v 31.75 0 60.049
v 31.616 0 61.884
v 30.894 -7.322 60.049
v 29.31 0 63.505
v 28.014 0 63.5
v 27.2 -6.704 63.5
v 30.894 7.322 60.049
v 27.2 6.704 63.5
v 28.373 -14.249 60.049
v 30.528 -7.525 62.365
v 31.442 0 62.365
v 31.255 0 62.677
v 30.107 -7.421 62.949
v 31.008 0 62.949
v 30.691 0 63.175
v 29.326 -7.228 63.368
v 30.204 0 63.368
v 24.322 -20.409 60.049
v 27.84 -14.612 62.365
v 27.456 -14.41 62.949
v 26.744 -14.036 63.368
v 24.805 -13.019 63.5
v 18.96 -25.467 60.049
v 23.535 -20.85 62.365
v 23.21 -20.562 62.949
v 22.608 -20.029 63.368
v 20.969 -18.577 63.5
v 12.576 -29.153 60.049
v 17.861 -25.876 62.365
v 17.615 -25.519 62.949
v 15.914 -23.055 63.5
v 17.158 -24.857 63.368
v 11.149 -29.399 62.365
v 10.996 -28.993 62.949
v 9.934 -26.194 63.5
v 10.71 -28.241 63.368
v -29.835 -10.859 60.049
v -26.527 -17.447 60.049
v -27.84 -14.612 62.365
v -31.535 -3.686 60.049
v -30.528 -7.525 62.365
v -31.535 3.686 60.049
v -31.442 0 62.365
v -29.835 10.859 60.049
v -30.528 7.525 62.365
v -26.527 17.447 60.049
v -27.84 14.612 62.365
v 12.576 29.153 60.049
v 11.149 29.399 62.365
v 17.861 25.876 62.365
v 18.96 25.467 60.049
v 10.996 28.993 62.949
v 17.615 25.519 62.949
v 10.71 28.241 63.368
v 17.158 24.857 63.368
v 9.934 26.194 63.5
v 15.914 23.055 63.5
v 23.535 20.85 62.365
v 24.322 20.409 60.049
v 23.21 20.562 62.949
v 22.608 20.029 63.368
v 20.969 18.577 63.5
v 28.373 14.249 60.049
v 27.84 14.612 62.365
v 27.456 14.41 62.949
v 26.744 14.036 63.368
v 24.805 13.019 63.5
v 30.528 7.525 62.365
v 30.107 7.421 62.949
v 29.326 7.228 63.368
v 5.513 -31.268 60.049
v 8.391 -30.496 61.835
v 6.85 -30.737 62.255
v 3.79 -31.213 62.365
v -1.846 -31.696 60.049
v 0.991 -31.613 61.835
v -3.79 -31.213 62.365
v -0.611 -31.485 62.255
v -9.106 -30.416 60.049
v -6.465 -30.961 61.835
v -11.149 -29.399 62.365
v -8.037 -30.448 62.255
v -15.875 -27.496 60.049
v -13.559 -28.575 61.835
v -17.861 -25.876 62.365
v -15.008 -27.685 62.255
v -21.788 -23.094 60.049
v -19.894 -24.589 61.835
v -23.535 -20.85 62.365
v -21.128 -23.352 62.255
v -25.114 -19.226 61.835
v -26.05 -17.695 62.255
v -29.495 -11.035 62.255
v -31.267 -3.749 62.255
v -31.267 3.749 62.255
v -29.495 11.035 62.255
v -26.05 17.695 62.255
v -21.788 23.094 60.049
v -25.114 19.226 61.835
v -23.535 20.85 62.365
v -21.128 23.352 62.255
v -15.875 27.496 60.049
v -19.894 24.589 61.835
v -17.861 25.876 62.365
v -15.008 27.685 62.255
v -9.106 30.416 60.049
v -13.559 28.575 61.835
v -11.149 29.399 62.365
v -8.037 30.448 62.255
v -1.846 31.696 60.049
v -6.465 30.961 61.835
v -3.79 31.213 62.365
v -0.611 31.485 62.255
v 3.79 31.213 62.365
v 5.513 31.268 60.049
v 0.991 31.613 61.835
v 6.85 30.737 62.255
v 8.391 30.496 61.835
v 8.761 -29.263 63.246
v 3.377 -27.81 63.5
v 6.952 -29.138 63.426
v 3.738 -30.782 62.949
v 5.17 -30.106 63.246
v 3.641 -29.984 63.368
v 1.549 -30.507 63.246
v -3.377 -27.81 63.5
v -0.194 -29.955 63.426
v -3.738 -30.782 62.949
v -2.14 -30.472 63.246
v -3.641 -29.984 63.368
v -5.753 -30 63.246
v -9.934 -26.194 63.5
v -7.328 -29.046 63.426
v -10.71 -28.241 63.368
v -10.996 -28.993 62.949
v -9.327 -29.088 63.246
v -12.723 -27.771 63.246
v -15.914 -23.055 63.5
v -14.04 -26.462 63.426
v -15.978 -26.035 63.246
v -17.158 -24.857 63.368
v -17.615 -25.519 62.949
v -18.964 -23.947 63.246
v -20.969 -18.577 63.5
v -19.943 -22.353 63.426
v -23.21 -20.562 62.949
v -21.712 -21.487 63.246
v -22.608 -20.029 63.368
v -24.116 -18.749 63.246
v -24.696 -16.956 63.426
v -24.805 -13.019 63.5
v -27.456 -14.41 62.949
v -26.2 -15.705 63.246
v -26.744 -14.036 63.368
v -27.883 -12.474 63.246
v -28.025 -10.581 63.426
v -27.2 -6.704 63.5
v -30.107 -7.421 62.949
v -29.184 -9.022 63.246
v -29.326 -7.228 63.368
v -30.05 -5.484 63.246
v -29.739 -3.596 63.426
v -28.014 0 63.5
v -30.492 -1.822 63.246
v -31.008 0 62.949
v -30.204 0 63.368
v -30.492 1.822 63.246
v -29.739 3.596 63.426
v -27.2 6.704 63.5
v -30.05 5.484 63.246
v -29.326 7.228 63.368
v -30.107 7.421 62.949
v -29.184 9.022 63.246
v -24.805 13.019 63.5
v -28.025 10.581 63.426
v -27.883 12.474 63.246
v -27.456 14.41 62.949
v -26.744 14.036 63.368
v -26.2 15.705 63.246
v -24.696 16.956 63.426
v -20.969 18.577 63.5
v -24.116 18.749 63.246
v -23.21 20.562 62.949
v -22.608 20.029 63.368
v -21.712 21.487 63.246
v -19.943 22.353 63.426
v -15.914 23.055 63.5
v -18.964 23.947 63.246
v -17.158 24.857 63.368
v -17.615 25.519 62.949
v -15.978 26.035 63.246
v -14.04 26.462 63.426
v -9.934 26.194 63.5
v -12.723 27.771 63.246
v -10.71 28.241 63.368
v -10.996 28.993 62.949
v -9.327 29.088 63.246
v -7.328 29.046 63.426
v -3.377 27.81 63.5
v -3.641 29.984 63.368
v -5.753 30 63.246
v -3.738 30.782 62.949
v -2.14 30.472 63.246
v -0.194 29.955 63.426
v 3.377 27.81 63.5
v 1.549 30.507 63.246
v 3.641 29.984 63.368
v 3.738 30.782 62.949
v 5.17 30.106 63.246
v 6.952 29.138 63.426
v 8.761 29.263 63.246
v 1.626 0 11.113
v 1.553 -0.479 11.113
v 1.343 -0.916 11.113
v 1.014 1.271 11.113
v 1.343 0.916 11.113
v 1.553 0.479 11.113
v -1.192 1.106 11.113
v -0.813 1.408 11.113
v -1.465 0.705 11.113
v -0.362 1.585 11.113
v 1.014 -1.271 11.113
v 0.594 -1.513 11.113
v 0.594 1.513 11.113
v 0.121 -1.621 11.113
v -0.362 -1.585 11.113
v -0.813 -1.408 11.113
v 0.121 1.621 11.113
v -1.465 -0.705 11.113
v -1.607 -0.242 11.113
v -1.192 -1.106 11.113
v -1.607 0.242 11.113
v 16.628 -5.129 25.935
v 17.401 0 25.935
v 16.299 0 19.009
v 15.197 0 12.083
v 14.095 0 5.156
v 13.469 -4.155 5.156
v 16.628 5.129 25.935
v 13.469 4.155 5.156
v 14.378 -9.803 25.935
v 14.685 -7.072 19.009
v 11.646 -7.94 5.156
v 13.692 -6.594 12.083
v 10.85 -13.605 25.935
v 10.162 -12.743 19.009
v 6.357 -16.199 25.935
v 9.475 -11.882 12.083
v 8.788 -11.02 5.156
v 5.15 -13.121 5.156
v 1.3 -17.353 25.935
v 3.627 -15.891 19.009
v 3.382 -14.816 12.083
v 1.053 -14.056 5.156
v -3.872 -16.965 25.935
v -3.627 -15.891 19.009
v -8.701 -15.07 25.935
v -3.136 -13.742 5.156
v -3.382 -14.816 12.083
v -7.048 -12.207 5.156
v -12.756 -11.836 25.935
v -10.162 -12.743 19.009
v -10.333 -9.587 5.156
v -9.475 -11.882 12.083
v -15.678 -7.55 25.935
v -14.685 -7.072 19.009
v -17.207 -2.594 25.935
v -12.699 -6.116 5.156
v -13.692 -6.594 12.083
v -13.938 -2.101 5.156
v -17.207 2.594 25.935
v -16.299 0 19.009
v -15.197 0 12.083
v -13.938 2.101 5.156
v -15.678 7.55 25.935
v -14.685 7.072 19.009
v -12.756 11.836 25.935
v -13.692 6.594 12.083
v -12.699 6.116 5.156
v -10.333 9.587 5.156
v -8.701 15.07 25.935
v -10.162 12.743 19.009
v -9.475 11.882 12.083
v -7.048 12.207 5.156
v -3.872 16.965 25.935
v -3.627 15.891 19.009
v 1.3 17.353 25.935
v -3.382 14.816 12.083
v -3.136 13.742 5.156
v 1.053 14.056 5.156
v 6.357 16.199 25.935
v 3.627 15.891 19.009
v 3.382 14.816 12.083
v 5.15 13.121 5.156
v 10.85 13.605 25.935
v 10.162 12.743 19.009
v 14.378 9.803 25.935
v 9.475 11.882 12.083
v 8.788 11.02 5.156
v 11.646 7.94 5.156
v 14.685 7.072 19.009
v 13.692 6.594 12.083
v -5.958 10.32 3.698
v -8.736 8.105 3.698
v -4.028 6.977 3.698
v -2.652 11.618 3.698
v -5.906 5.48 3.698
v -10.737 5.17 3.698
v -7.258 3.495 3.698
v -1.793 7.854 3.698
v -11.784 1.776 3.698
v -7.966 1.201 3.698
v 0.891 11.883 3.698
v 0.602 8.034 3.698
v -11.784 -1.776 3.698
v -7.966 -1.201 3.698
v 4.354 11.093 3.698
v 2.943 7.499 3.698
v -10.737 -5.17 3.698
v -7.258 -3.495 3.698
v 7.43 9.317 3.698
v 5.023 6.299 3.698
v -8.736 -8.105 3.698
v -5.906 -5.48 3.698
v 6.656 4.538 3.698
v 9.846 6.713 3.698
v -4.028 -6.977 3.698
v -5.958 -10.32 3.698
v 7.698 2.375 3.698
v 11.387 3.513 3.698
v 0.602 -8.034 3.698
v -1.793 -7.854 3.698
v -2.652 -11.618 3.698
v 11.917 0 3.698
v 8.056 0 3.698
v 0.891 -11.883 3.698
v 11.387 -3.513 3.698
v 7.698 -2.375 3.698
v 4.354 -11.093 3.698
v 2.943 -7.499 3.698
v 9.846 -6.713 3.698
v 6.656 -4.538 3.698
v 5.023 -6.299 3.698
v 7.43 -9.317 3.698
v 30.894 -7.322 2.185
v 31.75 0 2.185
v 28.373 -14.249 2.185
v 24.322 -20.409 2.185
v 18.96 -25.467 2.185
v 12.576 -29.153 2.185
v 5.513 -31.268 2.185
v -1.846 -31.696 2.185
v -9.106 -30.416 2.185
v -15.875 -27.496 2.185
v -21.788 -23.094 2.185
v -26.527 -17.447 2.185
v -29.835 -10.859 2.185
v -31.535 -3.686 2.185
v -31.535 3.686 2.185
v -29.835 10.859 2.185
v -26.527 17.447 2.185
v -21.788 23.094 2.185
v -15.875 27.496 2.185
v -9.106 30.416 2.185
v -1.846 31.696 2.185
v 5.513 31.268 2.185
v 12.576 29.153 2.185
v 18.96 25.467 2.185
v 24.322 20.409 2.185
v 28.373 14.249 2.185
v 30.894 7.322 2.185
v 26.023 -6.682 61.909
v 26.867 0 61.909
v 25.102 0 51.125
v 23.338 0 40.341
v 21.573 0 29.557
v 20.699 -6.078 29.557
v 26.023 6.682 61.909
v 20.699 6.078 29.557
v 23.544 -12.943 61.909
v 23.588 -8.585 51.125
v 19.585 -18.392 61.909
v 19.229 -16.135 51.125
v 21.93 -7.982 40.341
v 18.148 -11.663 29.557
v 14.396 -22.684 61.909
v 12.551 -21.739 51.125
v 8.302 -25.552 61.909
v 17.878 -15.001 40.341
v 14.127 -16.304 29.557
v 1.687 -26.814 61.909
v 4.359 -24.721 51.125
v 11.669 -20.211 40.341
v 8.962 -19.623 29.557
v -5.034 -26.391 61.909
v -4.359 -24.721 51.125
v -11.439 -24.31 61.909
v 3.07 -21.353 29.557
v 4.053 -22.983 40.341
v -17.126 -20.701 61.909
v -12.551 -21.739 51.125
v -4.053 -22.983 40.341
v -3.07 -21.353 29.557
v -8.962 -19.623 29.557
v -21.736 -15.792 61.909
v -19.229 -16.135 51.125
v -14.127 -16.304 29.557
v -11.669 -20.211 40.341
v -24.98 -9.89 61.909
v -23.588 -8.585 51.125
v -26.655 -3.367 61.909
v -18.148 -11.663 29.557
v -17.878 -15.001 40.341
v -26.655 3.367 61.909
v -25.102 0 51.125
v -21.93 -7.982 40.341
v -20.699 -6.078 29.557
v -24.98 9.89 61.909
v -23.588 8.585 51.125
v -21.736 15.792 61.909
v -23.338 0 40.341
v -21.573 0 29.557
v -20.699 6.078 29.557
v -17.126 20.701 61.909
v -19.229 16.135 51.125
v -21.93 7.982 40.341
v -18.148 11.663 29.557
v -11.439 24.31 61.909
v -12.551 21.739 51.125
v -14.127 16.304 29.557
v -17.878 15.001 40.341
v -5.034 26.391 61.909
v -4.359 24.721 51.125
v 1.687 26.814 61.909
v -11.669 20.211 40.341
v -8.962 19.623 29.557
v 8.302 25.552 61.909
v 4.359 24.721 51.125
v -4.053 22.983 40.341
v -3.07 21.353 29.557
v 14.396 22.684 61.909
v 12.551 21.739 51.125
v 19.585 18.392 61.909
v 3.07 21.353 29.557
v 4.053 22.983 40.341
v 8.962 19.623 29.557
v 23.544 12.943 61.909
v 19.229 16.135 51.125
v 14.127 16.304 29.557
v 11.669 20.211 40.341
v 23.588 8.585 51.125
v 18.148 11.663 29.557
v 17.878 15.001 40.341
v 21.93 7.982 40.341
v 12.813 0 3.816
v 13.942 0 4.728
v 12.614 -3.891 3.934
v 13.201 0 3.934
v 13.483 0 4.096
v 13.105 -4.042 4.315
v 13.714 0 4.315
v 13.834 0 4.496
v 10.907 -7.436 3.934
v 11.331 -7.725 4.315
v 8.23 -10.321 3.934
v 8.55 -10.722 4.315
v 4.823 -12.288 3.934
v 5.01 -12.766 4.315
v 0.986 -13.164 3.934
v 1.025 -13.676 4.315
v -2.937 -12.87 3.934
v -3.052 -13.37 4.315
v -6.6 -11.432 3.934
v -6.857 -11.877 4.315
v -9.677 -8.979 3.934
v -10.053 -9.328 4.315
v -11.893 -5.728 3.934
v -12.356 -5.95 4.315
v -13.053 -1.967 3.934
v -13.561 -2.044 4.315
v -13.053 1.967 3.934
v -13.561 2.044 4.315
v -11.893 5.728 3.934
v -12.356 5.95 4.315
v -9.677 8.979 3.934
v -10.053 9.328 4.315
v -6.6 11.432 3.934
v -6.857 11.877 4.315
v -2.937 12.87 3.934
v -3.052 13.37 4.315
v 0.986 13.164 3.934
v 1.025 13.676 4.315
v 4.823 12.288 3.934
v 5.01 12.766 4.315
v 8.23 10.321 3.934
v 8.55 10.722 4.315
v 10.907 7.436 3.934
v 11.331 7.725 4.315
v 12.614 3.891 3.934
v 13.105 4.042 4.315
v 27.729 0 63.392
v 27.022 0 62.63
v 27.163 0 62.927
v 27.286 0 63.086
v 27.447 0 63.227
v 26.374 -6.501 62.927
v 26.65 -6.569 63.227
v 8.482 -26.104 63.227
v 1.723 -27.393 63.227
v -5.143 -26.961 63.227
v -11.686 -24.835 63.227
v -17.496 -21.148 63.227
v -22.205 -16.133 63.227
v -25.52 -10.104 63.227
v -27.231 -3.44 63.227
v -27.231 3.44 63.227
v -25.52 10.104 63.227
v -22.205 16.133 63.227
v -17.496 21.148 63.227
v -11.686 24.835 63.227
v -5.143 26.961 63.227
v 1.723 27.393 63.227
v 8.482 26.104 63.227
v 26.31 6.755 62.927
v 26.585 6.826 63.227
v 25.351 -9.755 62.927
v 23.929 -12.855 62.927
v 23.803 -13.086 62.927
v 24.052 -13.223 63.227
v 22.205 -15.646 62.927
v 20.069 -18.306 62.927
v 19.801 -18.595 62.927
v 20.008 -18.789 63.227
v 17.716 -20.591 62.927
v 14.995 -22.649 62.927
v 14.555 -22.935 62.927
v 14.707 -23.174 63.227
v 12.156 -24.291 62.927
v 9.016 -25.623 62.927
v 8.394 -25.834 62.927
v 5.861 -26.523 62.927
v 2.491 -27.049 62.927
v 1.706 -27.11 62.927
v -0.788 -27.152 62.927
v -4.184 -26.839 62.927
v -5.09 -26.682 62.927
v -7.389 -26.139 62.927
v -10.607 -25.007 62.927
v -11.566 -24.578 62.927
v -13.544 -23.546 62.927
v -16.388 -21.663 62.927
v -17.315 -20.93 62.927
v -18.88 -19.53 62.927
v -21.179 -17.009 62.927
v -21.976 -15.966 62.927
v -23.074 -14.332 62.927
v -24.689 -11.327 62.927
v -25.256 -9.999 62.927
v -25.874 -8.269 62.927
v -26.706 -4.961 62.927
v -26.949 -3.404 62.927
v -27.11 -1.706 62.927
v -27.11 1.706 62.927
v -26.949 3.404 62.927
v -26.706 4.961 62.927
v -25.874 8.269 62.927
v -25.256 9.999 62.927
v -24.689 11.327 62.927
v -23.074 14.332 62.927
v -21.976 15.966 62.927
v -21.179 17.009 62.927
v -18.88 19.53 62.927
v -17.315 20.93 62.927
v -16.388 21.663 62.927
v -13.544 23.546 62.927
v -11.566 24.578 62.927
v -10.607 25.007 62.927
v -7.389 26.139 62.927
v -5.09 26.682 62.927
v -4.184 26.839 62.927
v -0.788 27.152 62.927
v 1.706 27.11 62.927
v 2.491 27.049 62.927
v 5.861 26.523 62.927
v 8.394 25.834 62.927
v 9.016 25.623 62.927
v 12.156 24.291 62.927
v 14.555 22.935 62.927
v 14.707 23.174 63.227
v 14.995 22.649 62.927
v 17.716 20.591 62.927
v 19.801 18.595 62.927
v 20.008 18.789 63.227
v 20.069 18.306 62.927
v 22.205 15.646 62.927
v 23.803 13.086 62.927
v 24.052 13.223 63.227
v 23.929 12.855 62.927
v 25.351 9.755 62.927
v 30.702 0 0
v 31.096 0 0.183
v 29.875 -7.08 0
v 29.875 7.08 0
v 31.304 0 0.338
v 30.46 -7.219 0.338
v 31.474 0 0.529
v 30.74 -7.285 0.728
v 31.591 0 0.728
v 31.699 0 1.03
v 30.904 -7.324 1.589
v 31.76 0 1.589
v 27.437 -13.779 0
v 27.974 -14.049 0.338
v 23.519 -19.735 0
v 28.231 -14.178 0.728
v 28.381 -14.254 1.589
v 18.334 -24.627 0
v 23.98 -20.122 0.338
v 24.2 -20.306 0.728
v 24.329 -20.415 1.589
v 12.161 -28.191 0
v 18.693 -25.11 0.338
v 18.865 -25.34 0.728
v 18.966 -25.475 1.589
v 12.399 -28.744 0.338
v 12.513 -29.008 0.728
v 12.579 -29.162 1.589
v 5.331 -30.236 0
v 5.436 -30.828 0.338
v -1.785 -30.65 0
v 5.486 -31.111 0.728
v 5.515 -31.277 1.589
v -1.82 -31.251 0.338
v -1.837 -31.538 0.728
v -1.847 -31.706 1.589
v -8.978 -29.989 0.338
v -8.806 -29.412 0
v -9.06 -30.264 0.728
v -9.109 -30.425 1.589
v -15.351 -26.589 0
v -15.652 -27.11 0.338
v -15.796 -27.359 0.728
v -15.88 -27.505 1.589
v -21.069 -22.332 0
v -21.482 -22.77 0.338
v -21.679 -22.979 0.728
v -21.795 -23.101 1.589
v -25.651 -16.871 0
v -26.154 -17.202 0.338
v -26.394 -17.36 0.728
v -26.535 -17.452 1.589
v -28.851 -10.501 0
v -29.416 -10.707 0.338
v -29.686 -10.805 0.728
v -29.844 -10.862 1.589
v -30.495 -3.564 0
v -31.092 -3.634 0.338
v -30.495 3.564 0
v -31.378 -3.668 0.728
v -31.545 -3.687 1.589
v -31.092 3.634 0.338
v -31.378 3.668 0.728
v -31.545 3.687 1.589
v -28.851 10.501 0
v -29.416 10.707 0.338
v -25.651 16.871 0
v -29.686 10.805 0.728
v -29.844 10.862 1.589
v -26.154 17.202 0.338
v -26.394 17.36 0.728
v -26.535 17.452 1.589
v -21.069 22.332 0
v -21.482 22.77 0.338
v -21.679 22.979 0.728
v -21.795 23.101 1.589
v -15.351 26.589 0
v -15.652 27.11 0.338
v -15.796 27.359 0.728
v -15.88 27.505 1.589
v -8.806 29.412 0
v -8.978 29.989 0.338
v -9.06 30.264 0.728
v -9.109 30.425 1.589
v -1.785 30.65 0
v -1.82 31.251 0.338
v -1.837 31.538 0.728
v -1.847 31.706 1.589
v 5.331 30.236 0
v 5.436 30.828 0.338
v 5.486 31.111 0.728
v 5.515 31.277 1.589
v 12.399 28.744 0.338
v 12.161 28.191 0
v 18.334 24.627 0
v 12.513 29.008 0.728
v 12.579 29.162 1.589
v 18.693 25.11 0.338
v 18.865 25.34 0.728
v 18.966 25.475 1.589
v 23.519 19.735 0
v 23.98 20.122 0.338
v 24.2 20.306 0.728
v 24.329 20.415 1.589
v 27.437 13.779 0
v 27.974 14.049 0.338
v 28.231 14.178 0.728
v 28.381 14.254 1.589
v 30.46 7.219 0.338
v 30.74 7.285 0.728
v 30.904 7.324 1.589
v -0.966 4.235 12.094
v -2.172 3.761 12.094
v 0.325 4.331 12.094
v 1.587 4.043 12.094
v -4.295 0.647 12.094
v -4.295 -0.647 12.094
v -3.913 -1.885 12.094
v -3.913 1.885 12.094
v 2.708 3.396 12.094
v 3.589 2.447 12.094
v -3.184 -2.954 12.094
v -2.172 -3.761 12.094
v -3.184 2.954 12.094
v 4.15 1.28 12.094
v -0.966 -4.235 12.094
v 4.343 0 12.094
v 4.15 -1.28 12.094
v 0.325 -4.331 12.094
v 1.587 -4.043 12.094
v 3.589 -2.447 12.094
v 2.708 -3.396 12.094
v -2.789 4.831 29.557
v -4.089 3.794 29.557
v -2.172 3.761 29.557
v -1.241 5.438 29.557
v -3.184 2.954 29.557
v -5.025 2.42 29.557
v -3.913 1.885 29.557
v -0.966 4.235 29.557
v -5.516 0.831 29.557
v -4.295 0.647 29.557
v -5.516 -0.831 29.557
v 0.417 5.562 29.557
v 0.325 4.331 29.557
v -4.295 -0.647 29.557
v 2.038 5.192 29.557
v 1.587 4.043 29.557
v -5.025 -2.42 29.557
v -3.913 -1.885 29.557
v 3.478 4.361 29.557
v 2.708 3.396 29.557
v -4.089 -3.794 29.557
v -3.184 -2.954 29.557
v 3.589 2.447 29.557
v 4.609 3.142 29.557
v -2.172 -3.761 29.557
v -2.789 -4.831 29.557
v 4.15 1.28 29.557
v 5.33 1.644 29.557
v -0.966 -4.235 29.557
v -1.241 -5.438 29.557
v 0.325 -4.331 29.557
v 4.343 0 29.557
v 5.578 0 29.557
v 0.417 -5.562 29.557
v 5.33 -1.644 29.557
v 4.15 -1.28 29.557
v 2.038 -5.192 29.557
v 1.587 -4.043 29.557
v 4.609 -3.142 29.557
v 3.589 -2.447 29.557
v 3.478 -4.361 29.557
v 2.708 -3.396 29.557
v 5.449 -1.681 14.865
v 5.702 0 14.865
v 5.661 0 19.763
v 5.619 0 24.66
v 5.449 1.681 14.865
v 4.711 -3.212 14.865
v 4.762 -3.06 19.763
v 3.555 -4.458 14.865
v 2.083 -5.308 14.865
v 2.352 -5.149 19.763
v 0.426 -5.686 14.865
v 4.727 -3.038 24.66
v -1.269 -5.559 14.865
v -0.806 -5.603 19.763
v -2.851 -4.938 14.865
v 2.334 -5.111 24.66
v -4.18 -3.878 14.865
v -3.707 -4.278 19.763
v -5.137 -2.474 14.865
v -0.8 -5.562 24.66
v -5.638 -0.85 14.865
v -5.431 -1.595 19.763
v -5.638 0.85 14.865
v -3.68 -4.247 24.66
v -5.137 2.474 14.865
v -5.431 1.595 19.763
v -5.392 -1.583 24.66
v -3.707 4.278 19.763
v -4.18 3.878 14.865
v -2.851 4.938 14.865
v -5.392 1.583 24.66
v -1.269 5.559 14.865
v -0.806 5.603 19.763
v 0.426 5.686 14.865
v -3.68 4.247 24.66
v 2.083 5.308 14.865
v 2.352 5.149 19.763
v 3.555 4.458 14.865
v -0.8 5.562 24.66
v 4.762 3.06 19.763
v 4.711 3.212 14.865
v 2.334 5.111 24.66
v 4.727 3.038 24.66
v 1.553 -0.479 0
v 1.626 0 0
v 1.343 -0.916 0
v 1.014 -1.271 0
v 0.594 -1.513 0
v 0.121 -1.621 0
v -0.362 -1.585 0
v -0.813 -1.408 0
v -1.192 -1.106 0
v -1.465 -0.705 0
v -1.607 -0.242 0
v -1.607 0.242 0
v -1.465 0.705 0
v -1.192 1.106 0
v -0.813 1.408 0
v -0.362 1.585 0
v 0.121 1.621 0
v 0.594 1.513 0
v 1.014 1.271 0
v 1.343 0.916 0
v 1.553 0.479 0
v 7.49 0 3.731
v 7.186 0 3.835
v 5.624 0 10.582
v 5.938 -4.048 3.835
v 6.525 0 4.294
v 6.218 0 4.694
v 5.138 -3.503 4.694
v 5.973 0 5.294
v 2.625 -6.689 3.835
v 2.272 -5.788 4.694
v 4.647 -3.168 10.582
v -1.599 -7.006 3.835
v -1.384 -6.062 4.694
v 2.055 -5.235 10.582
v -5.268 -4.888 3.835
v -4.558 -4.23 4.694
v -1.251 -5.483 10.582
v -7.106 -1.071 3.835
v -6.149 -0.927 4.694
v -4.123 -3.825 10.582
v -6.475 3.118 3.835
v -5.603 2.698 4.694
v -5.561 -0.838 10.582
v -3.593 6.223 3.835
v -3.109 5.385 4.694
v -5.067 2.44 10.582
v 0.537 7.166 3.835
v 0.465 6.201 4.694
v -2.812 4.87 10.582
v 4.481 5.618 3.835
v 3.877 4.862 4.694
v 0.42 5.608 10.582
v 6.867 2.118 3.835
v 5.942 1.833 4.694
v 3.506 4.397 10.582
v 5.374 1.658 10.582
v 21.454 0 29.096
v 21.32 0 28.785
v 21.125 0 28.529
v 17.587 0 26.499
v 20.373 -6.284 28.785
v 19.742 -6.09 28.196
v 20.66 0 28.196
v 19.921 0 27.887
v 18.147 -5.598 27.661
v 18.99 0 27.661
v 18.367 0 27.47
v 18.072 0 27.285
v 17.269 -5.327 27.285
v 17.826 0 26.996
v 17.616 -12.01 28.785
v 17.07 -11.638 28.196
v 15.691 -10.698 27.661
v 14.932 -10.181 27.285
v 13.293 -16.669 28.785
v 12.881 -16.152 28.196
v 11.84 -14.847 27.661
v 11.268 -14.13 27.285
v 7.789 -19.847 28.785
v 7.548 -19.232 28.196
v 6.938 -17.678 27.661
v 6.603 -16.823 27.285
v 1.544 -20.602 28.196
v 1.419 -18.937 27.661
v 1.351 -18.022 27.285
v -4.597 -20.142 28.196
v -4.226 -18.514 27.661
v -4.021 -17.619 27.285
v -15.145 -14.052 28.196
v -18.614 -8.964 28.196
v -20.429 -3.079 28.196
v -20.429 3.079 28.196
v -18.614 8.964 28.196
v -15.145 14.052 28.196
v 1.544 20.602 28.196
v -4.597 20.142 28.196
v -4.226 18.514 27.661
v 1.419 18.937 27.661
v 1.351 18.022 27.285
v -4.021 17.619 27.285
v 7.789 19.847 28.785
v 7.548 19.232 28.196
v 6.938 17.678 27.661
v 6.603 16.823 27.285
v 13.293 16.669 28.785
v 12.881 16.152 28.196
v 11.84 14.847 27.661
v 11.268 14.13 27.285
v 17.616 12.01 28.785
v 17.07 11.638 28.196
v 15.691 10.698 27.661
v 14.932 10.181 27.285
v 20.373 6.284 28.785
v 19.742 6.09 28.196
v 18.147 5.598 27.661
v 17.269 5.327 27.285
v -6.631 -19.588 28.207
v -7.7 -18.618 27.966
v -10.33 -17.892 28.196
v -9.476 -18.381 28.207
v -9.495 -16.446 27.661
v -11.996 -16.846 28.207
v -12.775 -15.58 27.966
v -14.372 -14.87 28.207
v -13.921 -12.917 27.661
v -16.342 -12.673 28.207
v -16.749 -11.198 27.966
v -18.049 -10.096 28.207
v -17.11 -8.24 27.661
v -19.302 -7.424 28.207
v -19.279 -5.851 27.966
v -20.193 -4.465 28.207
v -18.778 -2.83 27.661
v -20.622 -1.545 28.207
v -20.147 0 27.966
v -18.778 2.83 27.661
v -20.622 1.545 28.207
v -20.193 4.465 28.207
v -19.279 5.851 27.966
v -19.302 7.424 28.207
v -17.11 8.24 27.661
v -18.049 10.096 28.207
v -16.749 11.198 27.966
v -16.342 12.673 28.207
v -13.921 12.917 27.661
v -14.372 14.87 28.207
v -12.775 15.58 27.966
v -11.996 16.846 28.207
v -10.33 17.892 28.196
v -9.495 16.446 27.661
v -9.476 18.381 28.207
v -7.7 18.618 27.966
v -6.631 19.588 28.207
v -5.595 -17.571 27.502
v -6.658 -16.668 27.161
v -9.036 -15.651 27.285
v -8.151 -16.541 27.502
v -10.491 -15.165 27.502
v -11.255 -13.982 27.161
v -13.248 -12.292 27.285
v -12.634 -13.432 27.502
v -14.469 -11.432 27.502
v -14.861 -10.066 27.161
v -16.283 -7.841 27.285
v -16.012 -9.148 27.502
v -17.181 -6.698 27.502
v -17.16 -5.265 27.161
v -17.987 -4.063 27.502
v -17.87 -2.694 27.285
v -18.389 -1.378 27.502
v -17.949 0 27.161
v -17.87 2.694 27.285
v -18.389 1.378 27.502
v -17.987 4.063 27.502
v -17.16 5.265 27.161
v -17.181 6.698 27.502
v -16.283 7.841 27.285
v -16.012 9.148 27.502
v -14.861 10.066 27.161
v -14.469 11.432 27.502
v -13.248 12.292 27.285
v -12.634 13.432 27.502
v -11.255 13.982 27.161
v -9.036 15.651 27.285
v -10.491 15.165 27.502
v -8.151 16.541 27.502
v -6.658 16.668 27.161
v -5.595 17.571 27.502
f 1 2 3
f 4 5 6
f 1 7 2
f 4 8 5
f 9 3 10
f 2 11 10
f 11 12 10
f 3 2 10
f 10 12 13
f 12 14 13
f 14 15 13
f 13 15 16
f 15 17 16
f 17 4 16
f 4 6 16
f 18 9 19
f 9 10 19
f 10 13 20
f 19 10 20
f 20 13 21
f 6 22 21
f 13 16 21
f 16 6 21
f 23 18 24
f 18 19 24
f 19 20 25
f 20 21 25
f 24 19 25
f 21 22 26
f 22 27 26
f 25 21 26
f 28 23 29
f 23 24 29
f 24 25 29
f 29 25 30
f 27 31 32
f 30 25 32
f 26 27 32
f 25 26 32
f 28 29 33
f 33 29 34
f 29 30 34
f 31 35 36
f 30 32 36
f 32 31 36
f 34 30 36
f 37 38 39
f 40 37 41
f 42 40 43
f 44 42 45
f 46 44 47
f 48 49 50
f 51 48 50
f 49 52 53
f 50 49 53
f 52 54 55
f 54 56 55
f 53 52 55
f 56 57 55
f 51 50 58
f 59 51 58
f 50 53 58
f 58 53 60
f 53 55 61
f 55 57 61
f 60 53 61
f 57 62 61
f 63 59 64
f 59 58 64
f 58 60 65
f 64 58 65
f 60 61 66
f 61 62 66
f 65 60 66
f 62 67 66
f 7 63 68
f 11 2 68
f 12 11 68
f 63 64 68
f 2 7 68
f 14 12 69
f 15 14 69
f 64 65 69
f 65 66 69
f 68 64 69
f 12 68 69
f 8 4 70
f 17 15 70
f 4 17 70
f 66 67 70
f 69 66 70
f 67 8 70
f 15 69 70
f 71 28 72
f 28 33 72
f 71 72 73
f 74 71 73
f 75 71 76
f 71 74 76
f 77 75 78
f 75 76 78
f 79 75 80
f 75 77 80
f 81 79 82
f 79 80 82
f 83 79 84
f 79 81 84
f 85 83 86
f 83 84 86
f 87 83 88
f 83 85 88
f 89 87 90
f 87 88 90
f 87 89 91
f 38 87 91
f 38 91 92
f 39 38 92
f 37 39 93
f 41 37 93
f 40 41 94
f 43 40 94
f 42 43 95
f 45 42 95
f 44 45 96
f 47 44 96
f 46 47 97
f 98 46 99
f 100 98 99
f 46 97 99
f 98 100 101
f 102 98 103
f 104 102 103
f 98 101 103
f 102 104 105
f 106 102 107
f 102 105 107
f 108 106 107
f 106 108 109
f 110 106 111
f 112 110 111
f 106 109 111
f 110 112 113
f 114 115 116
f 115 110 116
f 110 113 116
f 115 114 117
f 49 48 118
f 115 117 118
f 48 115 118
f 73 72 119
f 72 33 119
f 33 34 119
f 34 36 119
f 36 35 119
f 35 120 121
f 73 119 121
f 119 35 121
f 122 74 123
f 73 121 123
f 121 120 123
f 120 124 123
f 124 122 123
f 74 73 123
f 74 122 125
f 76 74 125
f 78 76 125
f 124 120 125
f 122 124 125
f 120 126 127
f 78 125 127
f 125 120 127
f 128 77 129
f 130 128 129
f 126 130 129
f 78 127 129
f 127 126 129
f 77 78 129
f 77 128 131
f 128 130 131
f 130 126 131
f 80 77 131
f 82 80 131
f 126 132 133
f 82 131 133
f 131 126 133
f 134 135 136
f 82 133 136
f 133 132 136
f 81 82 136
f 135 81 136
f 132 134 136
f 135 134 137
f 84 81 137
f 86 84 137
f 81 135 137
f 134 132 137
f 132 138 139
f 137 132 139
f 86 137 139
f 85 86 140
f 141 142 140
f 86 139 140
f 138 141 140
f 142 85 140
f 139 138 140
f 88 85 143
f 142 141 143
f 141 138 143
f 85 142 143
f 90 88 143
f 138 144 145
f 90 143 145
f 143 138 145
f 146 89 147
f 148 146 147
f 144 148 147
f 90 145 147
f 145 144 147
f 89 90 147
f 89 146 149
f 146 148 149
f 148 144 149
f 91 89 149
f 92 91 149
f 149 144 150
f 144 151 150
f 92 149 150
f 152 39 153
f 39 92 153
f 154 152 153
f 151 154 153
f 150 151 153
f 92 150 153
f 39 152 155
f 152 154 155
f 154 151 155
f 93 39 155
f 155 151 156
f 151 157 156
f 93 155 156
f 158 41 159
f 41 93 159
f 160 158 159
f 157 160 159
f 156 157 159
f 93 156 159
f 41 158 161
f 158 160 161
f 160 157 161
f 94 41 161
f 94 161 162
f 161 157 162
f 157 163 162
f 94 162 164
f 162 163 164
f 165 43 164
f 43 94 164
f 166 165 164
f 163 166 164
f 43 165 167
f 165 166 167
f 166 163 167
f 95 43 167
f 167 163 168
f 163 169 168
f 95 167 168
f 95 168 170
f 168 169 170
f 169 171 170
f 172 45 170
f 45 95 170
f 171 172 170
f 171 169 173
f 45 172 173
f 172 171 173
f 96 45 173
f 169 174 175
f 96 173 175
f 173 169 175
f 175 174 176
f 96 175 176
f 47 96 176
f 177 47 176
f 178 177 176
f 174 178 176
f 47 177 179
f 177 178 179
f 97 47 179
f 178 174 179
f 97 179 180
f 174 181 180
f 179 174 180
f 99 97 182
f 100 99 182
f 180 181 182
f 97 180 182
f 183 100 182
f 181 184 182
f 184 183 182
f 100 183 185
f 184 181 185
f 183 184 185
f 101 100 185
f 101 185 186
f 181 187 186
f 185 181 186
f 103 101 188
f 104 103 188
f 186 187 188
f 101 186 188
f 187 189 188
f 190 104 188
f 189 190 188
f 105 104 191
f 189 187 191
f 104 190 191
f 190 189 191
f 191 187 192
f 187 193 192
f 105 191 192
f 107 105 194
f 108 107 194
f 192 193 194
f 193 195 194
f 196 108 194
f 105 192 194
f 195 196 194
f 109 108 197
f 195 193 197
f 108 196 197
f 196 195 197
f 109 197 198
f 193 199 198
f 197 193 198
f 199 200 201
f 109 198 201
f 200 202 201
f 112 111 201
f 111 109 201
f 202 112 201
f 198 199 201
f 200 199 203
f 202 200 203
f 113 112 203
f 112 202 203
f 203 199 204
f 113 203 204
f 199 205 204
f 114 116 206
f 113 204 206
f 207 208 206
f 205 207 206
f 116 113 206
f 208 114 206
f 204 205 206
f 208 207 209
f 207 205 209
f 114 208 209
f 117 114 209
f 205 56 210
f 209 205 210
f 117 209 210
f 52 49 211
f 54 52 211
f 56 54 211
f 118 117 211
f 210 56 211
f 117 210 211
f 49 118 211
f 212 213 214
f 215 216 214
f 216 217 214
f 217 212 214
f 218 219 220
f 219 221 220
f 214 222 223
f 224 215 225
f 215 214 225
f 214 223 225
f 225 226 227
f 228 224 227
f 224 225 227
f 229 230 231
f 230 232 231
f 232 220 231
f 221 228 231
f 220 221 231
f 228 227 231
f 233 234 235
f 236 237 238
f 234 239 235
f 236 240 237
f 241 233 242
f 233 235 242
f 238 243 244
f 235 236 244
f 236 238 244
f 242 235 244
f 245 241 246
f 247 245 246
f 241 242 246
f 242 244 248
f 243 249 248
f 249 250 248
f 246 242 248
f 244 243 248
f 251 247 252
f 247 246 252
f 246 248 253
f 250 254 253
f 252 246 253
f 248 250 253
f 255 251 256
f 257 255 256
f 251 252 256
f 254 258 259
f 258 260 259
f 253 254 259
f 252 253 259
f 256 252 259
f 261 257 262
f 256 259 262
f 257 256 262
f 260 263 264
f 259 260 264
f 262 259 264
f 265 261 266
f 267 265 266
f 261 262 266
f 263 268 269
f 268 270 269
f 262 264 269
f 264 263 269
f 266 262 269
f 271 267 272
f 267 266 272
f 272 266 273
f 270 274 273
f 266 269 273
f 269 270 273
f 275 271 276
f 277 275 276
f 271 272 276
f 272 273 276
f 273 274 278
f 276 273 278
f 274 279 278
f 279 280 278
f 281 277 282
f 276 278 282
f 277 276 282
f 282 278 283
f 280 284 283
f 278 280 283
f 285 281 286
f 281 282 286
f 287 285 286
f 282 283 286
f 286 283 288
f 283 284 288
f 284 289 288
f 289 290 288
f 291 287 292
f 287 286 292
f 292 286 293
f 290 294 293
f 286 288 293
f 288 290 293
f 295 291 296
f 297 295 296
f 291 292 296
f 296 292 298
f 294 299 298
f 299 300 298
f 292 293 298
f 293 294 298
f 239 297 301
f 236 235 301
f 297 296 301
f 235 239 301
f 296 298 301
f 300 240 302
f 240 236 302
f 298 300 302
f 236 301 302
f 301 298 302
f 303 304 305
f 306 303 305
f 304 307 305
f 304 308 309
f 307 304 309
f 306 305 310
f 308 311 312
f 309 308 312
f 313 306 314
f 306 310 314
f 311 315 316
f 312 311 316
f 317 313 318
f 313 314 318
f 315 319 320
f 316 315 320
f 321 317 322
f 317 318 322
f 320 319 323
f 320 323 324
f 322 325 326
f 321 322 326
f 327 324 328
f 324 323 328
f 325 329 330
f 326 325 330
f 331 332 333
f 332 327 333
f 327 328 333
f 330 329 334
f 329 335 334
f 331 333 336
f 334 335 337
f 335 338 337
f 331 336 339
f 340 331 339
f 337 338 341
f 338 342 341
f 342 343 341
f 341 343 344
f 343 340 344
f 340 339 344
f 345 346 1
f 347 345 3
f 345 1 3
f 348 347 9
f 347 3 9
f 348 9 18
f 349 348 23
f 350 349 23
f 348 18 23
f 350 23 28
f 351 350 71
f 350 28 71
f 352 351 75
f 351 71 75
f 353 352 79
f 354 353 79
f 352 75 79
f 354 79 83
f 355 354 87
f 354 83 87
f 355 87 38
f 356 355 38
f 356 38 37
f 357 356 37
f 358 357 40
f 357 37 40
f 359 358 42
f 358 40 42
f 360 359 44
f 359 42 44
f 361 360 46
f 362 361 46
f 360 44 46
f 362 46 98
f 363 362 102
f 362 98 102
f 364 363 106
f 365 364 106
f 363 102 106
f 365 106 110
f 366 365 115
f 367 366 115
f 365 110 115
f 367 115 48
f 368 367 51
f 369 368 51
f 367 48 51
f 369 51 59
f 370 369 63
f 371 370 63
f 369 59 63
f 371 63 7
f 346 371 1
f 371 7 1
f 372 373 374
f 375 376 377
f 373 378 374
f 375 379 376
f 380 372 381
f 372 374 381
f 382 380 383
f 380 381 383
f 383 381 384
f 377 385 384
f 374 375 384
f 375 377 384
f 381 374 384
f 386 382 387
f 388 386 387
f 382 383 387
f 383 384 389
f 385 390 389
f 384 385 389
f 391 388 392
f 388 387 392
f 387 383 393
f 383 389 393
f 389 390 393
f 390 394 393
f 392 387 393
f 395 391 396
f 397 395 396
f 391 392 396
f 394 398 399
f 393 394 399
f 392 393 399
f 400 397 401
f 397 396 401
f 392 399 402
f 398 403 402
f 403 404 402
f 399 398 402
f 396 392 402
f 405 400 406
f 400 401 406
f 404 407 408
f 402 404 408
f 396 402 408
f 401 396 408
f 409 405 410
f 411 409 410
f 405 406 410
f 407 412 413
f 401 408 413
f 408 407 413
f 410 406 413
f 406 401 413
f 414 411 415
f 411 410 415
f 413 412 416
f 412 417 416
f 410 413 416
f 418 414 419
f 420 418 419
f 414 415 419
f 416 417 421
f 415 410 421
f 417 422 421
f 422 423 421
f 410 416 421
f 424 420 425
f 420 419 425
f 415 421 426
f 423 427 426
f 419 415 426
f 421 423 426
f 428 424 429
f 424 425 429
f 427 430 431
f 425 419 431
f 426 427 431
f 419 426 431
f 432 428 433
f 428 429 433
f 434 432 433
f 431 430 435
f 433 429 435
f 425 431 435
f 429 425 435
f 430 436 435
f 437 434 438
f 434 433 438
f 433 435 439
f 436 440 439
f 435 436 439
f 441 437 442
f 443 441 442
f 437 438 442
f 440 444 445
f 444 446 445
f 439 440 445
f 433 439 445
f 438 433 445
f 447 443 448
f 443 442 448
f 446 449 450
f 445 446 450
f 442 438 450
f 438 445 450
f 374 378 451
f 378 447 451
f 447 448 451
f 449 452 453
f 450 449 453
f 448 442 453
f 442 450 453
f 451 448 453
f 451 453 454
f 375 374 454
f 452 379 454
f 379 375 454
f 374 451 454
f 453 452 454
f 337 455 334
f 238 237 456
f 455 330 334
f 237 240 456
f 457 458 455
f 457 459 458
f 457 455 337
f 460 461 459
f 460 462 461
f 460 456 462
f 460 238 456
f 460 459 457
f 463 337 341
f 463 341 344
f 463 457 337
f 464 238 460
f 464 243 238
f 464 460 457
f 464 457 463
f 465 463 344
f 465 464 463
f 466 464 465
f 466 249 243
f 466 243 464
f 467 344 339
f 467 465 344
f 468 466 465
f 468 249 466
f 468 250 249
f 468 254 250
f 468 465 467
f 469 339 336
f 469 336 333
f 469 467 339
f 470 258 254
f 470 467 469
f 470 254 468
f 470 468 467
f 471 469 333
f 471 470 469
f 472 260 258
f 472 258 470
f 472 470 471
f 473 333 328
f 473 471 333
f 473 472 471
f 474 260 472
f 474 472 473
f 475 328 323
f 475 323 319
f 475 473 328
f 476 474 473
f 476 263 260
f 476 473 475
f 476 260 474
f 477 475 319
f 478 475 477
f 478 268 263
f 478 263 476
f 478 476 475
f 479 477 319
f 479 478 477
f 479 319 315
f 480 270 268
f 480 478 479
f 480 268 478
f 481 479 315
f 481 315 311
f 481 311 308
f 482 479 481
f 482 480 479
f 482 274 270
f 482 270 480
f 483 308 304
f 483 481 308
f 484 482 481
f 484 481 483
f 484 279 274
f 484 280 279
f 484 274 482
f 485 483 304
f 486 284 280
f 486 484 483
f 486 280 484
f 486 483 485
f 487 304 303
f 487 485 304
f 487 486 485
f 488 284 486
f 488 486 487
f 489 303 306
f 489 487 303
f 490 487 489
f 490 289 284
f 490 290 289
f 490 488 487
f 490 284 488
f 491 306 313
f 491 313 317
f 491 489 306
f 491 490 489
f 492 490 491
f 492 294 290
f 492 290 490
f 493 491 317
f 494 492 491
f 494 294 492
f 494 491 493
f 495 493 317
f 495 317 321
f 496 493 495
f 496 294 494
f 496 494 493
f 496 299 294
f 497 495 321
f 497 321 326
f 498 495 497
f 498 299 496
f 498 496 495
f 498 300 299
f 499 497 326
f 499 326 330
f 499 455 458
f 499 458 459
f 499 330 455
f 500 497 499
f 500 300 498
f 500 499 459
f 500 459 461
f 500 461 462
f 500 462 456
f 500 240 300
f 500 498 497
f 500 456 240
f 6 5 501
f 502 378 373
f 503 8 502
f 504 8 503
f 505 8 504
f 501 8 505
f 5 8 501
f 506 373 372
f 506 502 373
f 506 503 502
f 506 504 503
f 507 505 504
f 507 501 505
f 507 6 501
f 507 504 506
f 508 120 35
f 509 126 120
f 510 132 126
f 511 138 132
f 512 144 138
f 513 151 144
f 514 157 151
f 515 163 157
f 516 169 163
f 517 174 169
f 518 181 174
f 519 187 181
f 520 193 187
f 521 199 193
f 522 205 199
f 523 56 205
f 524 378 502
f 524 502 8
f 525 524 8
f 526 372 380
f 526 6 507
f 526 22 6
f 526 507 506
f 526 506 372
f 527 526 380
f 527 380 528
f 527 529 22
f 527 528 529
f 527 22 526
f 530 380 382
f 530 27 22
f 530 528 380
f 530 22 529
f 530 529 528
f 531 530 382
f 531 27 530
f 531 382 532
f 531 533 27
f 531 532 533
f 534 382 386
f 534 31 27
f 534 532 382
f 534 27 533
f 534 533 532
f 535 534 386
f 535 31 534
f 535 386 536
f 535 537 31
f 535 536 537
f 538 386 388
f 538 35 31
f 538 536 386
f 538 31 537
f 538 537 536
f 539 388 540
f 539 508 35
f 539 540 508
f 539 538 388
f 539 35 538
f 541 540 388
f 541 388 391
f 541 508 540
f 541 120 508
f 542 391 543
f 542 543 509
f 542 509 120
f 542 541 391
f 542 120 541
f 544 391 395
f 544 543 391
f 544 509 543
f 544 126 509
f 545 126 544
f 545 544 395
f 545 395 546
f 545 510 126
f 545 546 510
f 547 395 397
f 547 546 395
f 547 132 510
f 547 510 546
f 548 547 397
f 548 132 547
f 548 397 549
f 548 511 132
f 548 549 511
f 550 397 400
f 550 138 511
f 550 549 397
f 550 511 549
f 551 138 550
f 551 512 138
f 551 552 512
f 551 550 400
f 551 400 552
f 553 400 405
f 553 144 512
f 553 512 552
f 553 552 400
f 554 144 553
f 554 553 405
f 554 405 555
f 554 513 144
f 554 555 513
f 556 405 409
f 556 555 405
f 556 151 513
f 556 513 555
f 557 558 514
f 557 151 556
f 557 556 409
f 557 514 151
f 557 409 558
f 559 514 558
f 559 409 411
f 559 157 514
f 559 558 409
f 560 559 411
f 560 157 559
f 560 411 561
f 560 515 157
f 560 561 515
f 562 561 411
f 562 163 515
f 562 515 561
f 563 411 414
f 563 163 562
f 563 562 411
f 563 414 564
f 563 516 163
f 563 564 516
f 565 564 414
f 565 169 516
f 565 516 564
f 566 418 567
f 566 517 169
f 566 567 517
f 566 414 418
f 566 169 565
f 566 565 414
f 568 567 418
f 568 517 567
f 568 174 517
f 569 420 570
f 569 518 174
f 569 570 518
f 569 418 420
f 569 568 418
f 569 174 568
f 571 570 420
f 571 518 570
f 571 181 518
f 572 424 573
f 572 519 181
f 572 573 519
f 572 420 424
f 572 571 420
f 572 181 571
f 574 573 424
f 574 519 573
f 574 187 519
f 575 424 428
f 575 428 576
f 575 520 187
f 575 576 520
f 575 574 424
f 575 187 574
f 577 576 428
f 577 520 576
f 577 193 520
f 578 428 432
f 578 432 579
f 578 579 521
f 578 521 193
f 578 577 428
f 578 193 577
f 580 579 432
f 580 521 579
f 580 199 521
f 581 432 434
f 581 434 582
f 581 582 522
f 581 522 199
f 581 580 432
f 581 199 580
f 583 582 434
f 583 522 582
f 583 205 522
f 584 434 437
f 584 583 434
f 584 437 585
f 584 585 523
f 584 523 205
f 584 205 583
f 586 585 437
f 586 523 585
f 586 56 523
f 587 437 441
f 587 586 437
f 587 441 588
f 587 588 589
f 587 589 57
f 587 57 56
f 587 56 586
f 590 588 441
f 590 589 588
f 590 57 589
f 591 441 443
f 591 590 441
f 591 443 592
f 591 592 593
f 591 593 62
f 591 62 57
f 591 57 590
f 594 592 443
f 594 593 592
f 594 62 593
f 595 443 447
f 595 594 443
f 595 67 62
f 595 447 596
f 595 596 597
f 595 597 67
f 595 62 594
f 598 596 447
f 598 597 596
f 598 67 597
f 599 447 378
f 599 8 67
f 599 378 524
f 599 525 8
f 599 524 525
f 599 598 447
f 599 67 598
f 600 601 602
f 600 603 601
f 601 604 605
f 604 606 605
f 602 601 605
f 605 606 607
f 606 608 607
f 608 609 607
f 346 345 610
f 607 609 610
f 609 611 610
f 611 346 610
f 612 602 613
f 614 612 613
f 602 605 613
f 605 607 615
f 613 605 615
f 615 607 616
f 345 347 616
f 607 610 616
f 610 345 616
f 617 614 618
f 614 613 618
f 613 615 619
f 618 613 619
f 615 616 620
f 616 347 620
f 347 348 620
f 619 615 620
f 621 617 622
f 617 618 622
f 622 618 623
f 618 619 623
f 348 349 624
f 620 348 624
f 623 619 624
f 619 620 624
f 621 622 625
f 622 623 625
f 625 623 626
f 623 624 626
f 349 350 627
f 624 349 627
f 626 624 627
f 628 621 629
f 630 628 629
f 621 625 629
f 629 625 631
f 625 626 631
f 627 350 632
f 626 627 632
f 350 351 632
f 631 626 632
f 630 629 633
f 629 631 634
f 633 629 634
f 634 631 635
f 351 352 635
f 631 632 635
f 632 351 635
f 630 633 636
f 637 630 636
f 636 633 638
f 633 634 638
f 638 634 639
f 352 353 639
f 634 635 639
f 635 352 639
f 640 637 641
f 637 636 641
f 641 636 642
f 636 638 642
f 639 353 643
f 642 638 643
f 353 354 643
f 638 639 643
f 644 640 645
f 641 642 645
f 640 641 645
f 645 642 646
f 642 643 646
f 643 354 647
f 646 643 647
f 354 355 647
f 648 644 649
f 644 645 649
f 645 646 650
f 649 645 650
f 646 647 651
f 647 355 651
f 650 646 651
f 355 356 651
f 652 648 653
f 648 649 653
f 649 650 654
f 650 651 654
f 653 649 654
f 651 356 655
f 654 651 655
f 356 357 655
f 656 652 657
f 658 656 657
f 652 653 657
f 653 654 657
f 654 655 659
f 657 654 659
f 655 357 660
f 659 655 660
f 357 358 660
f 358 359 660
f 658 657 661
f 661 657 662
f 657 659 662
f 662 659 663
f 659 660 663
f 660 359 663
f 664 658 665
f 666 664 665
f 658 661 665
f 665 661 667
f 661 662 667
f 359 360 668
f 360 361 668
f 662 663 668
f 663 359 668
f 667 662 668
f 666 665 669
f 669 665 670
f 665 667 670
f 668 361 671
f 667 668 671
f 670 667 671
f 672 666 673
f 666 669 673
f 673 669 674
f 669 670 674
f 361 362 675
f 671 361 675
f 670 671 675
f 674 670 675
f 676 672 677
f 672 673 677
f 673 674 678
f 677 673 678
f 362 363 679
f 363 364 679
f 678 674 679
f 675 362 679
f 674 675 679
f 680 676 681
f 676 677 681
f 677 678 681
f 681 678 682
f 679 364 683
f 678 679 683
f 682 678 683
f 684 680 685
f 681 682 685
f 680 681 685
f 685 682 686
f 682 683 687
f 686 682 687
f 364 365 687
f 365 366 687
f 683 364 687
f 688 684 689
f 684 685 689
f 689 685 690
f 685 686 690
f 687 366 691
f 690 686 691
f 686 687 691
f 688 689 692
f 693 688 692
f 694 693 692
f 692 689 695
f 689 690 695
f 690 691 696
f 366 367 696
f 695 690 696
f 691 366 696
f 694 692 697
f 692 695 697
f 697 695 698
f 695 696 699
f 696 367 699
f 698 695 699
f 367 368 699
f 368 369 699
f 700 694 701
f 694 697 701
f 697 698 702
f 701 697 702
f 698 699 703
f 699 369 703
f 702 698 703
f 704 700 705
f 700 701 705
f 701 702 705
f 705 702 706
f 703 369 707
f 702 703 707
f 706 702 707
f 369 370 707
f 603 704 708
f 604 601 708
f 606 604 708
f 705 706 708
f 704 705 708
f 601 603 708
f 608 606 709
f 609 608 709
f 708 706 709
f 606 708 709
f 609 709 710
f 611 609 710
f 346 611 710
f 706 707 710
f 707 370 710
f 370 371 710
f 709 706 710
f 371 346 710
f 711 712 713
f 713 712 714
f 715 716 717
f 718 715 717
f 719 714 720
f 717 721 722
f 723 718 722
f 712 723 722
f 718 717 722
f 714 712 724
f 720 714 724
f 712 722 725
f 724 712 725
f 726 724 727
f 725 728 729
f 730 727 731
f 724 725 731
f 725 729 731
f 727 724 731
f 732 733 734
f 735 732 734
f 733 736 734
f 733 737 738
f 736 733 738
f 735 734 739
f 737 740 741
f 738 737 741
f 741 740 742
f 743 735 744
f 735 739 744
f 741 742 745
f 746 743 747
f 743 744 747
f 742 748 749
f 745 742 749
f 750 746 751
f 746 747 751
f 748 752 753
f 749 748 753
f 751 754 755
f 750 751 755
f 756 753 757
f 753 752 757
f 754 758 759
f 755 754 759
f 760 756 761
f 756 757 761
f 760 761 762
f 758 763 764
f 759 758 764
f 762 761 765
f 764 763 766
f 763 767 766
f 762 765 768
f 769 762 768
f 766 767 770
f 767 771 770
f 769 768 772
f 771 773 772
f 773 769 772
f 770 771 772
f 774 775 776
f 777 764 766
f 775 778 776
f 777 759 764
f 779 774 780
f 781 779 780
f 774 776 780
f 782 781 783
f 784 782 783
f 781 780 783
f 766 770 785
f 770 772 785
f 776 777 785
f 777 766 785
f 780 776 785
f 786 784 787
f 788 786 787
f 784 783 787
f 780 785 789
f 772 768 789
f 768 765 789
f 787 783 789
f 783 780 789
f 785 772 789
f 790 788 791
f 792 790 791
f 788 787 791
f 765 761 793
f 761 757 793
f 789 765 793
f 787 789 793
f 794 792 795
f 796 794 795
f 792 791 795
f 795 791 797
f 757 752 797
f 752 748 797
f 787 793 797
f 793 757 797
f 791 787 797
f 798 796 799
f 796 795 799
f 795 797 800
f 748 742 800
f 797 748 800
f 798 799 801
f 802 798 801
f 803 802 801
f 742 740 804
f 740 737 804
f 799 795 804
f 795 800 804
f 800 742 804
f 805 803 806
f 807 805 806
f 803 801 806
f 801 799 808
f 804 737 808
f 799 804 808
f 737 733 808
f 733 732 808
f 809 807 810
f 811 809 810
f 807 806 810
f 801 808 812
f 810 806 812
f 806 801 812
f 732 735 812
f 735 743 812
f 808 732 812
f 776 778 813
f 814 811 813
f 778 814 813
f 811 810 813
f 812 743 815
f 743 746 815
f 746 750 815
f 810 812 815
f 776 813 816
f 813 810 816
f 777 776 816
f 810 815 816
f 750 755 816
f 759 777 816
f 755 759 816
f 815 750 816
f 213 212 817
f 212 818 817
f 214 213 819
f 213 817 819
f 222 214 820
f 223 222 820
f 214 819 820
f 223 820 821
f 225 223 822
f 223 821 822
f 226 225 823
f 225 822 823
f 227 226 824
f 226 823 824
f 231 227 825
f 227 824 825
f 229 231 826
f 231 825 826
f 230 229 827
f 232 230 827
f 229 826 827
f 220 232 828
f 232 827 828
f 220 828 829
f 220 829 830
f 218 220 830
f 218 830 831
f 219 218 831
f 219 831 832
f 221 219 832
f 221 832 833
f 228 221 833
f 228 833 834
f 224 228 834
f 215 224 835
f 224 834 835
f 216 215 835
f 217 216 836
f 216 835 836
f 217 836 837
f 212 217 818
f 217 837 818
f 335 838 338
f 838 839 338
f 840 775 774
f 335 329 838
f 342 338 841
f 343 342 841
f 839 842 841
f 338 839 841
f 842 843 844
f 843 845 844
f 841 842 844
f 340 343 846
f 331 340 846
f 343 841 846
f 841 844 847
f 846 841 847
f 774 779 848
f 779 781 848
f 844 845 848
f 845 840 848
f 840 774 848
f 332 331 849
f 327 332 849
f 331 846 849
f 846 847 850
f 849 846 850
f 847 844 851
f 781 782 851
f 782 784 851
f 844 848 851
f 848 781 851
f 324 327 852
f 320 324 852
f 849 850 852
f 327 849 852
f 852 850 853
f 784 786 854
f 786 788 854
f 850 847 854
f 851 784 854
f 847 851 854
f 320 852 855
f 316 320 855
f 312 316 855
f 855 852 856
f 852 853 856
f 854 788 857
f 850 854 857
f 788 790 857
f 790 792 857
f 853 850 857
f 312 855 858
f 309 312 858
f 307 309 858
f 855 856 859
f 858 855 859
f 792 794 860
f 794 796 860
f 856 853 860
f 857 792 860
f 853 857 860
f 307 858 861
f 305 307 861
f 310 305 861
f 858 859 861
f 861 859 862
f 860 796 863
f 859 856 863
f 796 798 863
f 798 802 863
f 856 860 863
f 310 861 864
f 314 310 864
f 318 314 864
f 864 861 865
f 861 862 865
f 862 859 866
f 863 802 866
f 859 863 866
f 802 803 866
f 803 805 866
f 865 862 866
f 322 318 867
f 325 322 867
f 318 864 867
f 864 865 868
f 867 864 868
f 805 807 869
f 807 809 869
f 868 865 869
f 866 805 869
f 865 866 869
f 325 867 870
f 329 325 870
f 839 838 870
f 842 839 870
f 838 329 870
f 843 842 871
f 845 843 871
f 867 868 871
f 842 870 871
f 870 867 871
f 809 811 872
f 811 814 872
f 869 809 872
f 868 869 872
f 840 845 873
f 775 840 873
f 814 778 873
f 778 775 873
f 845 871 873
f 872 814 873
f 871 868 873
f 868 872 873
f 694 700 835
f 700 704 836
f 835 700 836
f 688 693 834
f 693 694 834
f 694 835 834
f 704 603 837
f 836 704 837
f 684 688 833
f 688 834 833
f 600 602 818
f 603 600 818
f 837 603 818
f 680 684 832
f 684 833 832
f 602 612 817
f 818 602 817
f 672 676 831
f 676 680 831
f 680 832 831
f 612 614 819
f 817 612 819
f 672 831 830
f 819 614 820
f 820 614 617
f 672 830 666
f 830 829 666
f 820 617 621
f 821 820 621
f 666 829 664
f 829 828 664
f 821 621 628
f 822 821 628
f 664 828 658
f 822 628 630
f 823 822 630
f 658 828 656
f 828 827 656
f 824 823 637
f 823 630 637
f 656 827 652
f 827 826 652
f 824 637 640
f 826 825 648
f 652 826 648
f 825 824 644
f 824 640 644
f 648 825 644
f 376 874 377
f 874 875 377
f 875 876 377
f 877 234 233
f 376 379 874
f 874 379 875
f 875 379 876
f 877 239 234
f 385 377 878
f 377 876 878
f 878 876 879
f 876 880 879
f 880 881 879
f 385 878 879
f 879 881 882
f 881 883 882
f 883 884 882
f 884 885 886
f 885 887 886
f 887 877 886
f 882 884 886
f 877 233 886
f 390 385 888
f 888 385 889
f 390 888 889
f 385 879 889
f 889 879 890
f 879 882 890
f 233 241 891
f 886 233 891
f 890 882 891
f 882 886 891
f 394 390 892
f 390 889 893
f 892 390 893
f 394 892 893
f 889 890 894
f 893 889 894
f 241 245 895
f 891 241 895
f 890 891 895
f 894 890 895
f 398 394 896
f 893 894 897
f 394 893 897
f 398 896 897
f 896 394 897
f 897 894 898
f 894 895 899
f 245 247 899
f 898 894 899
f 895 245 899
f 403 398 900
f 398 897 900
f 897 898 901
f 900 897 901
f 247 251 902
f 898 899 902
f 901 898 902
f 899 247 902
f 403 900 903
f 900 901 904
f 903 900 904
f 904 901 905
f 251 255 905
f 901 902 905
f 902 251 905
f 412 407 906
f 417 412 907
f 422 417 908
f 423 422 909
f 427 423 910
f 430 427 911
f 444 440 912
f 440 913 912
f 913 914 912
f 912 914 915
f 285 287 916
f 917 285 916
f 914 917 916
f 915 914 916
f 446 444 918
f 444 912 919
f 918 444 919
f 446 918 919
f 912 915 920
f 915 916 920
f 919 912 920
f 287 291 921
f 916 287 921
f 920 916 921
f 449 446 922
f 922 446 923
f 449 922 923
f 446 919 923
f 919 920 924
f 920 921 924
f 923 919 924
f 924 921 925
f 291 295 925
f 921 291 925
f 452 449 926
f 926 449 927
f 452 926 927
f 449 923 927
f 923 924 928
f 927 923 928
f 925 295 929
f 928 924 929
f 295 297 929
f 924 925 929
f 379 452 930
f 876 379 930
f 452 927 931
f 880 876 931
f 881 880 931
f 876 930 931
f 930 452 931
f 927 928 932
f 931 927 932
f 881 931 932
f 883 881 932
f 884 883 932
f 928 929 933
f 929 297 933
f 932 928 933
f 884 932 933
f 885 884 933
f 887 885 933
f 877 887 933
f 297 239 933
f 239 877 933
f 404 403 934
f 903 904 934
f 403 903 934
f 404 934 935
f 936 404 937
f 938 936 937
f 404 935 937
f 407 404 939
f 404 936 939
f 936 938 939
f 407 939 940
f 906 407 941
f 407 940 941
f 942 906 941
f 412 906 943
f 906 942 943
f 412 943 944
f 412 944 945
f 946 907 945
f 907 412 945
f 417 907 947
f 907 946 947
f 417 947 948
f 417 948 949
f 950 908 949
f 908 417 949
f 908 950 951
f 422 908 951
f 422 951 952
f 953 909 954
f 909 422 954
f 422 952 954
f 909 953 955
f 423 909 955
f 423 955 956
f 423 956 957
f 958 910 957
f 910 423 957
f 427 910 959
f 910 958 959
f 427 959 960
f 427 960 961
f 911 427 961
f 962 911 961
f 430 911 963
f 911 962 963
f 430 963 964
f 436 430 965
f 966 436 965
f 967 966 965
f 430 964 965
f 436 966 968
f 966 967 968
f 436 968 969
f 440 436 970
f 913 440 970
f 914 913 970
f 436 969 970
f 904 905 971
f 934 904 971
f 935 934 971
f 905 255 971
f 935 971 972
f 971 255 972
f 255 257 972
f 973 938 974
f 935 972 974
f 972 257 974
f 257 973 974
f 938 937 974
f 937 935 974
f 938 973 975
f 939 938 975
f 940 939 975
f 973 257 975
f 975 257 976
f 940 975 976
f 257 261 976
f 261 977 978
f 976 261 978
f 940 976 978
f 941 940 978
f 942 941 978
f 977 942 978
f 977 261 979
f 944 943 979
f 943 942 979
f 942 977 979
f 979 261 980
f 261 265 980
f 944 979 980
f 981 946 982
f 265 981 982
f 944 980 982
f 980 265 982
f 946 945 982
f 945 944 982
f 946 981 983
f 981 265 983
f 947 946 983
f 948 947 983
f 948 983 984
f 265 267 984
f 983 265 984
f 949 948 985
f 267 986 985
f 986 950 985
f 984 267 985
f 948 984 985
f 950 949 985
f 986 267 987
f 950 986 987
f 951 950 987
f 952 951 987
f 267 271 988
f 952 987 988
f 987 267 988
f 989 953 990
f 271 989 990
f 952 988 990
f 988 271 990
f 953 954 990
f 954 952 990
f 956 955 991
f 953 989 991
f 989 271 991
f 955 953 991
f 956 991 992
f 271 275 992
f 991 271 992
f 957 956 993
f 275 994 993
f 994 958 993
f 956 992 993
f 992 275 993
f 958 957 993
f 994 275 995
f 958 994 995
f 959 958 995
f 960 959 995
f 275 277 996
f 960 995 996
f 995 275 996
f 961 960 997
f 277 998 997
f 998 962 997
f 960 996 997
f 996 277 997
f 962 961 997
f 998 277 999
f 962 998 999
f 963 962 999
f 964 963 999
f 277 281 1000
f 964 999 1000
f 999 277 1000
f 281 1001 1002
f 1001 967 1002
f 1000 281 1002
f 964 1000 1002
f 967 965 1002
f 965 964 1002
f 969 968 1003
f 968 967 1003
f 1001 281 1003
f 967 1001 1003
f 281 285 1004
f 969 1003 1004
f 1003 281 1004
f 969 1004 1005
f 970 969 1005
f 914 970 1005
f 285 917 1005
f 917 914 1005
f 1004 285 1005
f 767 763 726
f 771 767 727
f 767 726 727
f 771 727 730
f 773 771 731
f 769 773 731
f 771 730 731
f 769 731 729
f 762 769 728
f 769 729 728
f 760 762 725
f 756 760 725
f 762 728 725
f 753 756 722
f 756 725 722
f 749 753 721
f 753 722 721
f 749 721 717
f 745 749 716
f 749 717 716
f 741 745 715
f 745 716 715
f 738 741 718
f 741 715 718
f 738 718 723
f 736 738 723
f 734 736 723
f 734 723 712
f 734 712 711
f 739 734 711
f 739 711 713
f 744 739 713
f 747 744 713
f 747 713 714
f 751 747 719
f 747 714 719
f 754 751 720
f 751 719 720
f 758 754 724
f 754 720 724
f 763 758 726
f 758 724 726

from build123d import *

# Parameters (mm, degrees)
F2_R     = 4.7469508404
F3_DEPTH = 9.525


with BuildPart() as f1:
    # F0 (on Front) → F1 (revolve)
    with BuildSketch(Plane.XZ):
        with BuildLine():
            Line((0, 0.9812490329), (0, 0))
            Line((0, 0), (1.6256, 0))
            Line((1.6256, 0), (1.6256, -11.1125))
            Line((1.6256, -11.1125), (30.7023078203, -11.1125))
            add(Edge.make_bspline(
                [(30.7023078203, -11.1125), (30.975852623, -11.017721514), (31.4389798048, -10.756400634), (31.7986107057, -9.9843307947), (31.7579196289, -9.2882845492), (31.75, -8.9282086119)],
                knots=[0, 0, 0, 0, 0.3174594219, 0.6335304223, 1, 1, 1, 1], degree=3))
            Line((31.75, -8.9282086119), (31.75, 48.9360690117))
            add(Edge.make_bspline(
                [(31.75, 48.9360690117), (31.7690109769, 49.8770929634), (31.6965917292, 50.8710171888), (30.9631042597, 52.1404272499), (29.7465902322, 52.4777620687), (28.0142854899, 52.3875)],
                knots=[0, 0, 0, 0, 0.3377299292, 0.586648381, 1, 1, 1, 1], degree=3))
            add(Edge.make_bspline(
                [(26.8668010831, 50.795905292), (26.8898471956, 51.0624120291), (27.0014352562, 51.5605867069), (27.3108313644, 52.0939557348), (27.8105565728, 52.3295162182), (28.0142854899, 52.3875)],
                knots=[0, 0, 0, 0, 0.3503710232, 0.6602361207, 1, 1, 1, 1], degree=3))
            Line((26.8668010831, 50.795905292), (21.5729530901, 18.4437490329))
            add(Edge.make_bspline(
                [(21.5729530901, 18.4437490329), (21.4991443202, 18.1161719718), (21.3483020233, 17.4467057765), (20.3362117179, 16.8851277771), (19.3413363836, 16.5933430901), (17.8793223703, 16.3738850883), (17.5645418022, 15.3518021904), (17.4014624208, 14.8222884163)],
                knots=[0, 0, 0, 0, 0.1816311799, 0.3711979544, 0.5628036991, 0.7735003063, 1, 1, 1, 1], degree=3))
            Line((17.4014624208, 14.8222884163), (14.0951965004, -5.9567838907))
            add(Edge.make_bspline(
                [(11.9167603552, -7.4151717126), (12.2292079791, -7.3365245376), (12.9263437553, -7.3725729241), (13.8308093416, -6.8643295221), (13.9993532378, -6.2139360125), (14.0951965004, -5.9567838907)],
                knots=[0, 0, 0, 0, 0.3424595324, 0.676447942, 1, 1, 1, 1], degree=3))
            Line((11.9167603552, -7.4151717126), (8.0561200157, -7.4151717126))
            add(Edge.make_bspline(
                [(8.0561200157, -7.4151717126), (7.3718139471, -7.4351340913), (6.9999702595, -7.1287769193), (5.1659517697, -6.1336385829), (5.7704470046, 2.913095458), (5.702091381, 3.7524529994)],
                knots=[0, 0, 0, 0, 0.1950466471, 0.4371978025, 1, 1, 1, 1], degree=3))
            Line((5.702091381, 3.7524529994), (5.5778109236, 18.4437490329))
            Line((5.5778109236, 18.4437490329), (4.3434, 18.4437490329))
            Line((4.3434, 18.4437490329), (4.3434, 0.9812490329))
            Line((4.3434, 0.9812490329), (0, 0.9812490329))
        make_face()
    revolve(axis=Axis((0, 0, 0.4906245165), (0, 0, -1)))


with BuildPart() as f3:
    # F2 (on face) → F3 (new body)
    with BuildSketch(Plane.XY.offset(0.9812490329)):
        Circle(F2_R)
    extrude(amount=F3_DEPTH)


with BuildPart() as f1_1:
    # F5: moved
    add(f1.part.moved(Location((0, 0, 11.113))))


solid = f1_1.part
